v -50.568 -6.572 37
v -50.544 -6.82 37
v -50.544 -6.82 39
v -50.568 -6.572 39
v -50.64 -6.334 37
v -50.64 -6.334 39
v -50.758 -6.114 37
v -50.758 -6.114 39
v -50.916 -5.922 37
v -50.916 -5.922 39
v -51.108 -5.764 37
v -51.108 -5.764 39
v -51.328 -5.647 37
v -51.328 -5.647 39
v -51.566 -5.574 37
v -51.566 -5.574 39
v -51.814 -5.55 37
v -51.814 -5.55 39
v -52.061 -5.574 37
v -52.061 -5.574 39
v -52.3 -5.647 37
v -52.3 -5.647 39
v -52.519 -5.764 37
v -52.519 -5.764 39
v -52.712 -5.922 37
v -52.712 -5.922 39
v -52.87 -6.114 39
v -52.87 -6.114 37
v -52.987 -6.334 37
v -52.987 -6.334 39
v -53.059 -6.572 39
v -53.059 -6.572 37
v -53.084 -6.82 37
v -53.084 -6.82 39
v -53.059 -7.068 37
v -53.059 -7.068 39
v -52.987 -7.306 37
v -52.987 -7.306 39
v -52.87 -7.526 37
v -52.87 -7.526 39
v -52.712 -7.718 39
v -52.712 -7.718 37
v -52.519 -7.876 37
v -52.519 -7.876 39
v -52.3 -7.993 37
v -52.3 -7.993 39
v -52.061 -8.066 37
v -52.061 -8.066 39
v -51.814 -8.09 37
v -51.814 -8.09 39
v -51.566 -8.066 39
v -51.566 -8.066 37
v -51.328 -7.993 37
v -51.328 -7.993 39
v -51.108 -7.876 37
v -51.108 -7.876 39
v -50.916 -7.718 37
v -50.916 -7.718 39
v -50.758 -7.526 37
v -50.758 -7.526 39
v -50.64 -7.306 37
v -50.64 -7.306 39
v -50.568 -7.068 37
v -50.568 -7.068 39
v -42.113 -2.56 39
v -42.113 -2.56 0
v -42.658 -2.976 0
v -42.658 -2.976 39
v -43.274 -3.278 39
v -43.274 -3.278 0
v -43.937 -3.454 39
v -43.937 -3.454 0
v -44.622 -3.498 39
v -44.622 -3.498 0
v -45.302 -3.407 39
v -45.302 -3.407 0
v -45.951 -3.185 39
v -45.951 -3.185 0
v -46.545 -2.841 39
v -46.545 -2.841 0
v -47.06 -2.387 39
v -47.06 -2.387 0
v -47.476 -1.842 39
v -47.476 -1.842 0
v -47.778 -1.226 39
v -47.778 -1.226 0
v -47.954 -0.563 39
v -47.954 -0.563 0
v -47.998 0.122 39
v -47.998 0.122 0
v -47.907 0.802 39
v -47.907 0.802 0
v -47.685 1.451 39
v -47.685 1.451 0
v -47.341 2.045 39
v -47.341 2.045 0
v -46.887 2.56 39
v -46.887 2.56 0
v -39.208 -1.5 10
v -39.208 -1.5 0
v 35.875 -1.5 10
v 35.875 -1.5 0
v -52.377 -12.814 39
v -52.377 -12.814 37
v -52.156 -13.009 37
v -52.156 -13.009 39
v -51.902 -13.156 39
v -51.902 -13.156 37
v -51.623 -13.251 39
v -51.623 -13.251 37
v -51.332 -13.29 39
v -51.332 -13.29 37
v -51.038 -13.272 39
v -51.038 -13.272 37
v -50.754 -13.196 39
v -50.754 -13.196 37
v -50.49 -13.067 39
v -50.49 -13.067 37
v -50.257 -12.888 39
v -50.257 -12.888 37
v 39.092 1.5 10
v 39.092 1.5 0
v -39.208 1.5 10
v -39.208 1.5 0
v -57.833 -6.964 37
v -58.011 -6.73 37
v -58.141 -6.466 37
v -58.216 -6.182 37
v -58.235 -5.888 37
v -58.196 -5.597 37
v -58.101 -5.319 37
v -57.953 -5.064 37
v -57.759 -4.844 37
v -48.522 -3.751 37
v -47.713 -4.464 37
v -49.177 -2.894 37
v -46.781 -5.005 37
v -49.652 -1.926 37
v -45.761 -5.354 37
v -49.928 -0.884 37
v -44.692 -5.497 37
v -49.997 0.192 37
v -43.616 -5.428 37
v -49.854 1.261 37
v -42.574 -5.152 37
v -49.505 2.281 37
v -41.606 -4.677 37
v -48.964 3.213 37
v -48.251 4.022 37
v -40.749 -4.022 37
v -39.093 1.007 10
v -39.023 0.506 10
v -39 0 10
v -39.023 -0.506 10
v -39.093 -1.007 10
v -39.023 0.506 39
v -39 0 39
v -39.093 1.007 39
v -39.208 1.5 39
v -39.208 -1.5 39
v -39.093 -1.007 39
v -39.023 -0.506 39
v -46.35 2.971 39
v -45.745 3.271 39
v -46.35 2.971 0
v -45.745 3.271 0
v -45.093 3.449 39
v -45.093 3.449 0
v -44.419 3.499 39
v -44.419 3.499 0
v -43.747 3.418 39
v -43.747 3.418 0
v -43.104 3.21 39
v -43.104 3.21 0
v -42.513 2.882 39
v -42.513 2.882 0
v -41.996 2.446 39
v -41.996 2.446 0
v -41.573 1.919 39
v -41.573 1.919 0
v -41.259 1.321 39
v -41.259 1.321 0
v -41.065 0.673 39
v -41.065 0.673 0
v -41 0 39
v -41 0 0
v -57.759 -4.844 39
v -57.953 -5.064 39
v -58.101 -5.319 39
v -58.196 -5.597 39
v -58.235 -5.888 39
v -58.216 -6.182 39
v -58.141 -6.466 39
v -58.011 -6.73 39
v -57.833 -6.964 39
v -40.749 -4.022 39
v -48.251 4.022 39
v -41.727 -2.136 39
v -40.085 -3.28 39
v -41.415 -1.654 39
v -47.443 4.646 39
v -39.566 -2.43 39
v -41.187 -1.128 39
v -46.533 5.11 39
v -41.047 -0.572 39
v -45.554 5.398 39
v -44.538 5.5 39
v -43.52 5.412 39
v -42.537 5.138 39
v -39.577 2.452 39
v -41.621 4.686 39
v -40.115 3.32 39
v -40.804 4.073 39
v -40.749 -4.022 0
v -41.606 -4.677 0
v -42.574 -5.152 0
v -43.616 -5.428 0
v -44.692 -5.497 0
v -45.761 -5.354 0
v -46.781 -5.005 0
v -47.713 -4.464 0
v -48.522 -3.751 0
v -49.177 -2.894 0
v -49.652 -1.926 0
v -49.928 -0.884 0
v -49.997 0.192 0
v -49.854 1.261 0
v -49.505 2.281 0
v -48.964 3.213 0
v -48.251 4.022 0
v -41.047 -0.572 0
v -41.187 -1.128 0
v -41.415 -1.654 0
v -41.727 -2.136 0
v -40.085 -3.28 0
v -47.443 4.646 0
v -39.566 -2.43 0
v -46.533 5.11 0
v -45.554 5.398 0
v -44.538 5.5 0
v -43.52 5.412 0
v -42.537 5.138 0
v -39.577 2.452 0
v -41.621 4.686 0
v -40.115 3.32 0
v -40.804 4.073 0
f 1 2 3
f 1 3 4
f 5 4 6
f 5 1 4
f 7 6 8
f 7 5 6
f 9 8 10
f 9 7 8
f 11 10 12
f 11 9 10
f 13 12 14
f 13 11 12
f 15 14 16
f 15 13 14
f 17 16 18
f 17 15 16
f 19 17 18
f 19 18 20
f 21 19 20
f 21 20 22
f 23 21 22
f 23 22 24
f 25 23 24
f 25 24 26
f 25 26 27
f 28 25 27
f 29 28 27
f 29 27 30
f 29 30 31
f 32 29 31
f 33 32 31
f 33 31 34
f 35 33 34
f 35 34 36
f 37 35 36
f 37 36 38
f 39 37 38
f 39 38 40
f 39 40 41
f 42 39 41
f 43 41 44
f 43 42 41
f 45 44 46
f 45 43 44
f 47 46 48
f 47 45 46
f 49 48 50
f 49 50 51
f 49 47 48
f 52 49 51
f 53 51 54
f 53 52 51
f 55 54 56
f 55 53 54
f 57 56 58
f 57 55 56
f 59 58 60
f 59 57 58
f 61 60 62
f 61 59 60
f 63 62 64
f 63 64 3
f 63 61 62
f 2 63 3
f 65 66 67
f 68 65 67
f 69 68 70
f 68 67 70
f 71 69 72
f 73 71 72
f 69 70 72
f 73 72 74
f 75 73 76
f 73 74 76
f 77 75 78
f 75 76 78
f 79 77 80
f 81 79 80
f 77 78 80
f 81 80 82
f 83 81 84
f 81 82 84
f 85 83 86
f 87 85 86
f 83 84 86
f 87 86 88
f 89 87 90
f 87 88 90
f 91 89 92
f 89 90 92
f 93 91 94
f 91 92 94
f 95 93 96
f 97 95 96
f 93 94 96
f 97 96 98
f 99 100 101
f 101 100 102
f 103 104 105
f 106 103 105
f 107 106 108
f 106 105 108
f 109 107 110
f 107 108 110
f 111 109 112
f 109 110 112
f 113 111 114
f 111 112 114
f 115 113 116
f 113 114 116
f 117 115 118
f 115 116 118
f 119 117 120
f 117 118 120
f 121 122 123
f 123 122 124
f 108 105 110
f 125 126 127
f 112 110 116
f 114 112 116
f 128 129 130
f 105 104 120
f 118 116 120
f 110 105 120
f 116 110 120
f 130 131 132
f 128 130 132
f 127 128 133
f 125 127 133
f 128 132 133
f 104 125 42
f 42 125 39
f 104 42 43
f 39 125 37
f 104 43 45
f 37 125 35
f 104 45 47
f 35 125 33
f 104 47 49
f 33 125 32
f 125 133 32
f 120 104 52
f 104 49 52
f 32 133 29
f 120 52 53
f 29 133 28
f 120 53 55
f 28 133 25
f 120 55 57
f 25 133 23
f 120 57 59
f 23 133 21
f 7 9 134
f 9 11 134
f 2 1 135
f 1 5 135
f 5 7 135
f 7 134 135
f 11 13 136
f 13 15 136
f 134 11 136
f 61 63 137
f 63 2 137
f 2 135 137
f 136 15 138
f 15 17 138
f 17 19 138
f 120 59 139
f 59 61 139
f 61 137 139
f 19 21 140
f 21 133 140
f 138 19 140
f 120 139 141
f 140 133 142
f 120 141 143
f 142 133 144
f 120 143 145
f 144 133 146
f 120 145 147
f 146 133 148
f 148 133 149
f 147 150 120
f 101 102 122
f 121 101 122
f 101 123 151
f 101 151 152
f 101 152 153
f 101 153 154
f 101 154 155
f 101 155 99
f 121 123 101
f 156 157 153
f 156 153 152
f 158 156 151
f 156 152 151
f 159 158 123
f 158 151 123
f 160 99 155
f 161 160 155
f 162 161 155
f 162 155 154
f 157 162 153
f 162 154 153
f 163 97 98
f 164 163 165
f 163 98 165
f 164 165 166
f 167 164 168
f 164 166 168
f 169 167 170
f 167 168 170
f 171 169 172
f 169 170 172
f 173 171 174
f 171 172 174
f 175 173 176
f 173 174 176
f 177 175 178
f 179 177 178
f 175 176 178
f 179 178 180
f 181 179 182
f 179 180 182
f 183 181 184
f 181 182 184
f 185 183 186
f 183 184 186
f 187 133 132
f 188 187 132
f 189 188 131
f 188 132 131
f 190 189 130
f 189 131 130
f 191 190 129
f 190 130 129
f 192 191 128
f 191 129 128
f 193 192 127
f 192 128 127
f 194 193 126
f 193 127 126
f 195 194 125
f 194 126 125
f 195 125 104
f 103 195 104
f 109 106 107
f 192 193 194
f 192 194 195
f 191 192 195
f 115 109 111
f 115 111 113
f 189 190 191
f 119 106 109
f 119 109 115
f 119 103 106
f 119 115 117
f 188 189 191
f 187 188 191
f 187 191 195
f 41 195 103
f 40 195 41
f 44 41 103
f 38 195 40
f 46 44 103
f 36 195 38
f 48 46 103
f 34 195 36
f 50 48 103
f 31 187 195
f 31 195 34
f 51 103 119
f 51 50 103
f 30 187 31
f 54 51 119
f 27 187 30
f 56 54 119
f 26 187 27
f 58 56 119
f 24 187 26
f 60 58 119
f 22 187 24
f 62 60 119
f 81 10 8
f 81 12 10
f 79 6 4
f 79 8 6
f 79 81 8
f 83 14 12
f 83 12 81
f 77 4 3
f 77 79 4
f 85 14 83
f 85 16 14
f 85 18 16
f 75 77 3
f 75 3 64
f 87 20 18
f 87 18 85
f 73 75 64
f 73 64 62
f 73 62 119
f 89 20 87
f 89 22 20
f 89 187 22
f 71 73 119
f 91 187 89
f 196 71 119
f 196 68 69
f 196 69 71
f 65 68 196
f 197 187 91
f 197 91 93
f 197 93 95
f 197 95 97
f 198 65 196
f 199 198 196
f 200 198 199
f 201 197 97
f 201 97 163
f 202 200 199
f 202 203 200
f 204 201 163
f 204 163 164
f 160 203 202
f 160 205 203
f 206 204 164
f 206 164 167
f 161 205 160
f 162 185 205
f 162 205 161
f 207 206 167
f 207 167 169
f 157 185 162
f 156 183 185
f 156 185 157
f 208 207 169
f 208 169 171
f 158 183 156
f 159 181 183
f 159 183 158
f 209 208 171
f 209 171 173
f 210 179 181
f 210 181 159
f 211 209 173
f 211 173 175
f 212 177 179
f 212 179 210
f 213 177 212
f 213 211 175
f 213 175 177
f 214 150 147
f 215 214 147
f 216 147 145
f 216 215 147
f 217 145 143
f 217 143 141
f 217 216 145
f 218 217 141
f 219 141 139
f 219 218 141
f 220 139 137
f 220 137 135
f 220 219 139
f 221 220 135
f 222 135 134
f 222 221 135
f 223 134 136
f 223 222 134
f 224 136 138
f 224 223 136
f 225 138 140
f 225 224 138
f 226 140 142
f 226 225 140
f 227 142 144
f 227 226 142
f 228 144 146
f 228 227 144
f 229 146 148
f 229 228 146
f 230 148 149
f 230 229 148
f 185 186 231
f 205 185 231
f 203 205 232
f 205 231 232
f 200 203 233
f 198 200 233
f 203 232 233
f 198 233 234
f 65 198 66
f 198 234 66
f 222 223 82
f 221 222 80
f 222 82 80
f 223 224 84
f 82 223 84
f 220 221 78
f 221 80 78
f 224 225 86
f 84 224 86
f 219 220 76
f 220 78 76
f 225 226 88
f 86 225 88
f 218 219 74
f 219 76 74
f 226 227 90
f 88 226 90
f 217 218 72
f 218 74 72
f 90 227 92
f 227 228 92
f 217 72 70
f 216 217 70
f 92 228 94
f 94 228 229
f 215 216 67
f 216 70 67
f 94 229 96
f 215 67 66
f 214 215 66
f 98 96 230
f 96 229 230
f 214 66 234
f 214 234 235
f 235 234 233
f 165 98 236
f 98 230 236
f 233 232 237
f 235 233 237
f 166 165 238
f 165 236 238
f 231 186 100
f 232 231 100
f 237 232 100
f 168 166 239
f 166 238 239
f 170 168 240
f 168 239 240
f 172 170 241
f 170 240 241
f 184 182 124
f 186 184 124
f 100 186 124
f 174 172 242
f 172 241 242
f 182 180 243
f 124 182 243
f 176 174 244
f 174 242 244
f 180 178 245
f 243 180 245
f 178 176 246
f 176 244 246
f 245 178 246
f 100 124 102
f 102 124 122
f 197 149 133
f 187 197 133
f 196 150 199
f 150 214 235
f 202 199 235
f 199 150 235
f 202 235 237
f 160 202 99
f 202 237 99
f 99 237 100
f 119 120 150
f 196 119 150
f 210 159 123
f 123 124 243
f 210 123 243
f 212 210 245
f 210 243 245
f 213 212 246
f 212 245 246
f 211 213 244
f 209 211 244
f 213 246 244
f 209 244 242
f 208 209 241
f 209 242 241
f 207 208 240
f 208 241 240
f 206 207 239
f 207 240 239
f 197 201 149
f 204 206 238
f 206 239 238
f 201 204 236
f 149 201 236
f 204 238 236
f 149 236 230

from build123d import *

# Parameters (mm, degrees)
F1_DEPTH = 10
F2_DEPTH = 39
F3_R     = 1.27
F4_DEPTH = 39
F0_R     = 1.27
F5_DEPTH = 37


# Not quite as in the source:
# - a feature names something its author has since deleted; it is built from what else it names


with BuildPart() as f1:
    # F0 (on Top) → F1 (new body)
    with BuildSketch(Plane.XY):
        with BuildLine():
            Line((39.0916730868, 1.5), (-39.2084973779, 1.5))
            ThreePointArc((-39.2084973779, 1.5), (-39.0523737086, 0.7572105316), (-39, 0))
            ThreePointArc((-39, 0), (-39.0523737086, -0.7572105316), (-39.2084973779, -1.5))
            Line((-39.2084973779, -1.5), (35.8745669567, -1.5))
            Line((35.8745669567, -1.5), (39.0916730868, 1.5))
        make_face()
    extrude(amount=F1_DEPTH)

    # F0 (on Top) → F2 (join)
    with BuildSketch(Plane.XY):
        with BuildLine():
            ThreePointArc((-42.1130057398, -2.5597379557), (-47.0597379557, -2.3869942602), (-46.8869942602, 2.5597379557))
            Line((-46.8869942602, 2.5597379557), (-48.2509909803, 4.0224453589))
            ThreePointArc((-48.2509909803, 4.0224453589), (-48.5224453589, -3.7509909803), (-40.7490090197, -4.0224453589))
            Line((-40.7490090197, -4.0224453589), (-42.1130057398, -2.5597379557))
        make_face()
        with BuildLine():
            ThreePointArc((-46.8869942602, 2.5597379557), (-43.1043782588, 3.2097102603), (-41, 0))
            ThreePointArc((-41, 0), (-41.2902897397, -1.3956217412), (-42.1130057398, -2.5597379557))
            Line((-42.1130057398, -2.5597379557), (-40.7490090197, -4.0224453589))
            ThreePointArc((-40.7490090197, -4.0224453589), (-39.8061364224, -2.866643458), (-39.2084973779, -1.5))
            ThreePointArc((-39.2084973779, -1.5), (-39.0523737086, -0.7572105316), (-39, 0))
            ThreePointArc((-39, 0), (-39.0523737086, 0.7572105316), (-39.2084973779, 1.5))
            ThreePointArc((-39.2084973779, 1.5), (-43.0221716349, 5.2977375665), (-48.2509909803, 4.0224453589))
            Line((-48.2509909803, 4.0224453589), (-46.8869942602, 2.5597379557))
        make_face()
    extrude(amount=F2_DEPTH)

    # F3 (on face) → F4 (join)
    with BuildSketch(Plane.XY):
        with BuildLine():
            Line((-50.2566071407, -12.8884240397), (-40.7490090197, -4.0224453589))
            ThreePointArc((-40.7490090197, -4.0224453589), (-48.5224453589, -3.7509909803), (-48.2509909803, 4.0224453589))
            Line((-48.2509909803, 4.0224453589), (-57.7585891014, -4.8435333219))
            ThreePointArc((-57.7585891014, -4.8435333219), (-58.2346778018, -5.8882146293), (-57.8326221137, -6.9635614144))
            Line((-57.8326221137, -6.9635614144), (-52.3766352332, -12.8143910274))
            ThreePointArc((-52.3766352332, -12.8143910274), (-51.3319539259, -13.2904797278), (-50.2566071407, -12.8884240397))
        make_face()
        with Locations((-51.8135370162, -6.8199836006)):
            Circle(F3_R, mode=Mode.SUBTRACT)
    extrude(amount=F4_DEPTH)

    # F0 (on Top) → F5 (cut)
    with BuildSketch(Plane.XY):
        with BuildLine():
            ThreePointArc((-40.7490090197, -4.0224453589), (-48.5224453589, -3.7509909803), (-48.2509909803, 4.0224453589))
            Line((-48.2509909803, 4.0224453589), (-57.7585891014, -4.8435333219))
            ThreePointArc((-57.7585891014, -4.8435333219), (-58.2346778018, -5.8882146293), (-57.8326221137, -6.9635614144))
            Line((-57.8326221137, -6.9635614144), (-52.3766352332, -12.8143910274))
            ThreePointArc((-52.3766352332, -12.8143910274), (-51.3319539259, -13.2904797278), (-50.2566071407, -12.8884240397))
            Line((-50.2566071407, -12.8884240397), (-40.7490090197, -4.0224453589))
        make_face()
        with Locations((-51.8135370162, -6.8199836006)):
            Circle(F0_R, mode=Mode.SUBTRACT)
    extrude(amount=F5_DEPTH, mode=Mode.SUBTRACT)


solid = f1.part
